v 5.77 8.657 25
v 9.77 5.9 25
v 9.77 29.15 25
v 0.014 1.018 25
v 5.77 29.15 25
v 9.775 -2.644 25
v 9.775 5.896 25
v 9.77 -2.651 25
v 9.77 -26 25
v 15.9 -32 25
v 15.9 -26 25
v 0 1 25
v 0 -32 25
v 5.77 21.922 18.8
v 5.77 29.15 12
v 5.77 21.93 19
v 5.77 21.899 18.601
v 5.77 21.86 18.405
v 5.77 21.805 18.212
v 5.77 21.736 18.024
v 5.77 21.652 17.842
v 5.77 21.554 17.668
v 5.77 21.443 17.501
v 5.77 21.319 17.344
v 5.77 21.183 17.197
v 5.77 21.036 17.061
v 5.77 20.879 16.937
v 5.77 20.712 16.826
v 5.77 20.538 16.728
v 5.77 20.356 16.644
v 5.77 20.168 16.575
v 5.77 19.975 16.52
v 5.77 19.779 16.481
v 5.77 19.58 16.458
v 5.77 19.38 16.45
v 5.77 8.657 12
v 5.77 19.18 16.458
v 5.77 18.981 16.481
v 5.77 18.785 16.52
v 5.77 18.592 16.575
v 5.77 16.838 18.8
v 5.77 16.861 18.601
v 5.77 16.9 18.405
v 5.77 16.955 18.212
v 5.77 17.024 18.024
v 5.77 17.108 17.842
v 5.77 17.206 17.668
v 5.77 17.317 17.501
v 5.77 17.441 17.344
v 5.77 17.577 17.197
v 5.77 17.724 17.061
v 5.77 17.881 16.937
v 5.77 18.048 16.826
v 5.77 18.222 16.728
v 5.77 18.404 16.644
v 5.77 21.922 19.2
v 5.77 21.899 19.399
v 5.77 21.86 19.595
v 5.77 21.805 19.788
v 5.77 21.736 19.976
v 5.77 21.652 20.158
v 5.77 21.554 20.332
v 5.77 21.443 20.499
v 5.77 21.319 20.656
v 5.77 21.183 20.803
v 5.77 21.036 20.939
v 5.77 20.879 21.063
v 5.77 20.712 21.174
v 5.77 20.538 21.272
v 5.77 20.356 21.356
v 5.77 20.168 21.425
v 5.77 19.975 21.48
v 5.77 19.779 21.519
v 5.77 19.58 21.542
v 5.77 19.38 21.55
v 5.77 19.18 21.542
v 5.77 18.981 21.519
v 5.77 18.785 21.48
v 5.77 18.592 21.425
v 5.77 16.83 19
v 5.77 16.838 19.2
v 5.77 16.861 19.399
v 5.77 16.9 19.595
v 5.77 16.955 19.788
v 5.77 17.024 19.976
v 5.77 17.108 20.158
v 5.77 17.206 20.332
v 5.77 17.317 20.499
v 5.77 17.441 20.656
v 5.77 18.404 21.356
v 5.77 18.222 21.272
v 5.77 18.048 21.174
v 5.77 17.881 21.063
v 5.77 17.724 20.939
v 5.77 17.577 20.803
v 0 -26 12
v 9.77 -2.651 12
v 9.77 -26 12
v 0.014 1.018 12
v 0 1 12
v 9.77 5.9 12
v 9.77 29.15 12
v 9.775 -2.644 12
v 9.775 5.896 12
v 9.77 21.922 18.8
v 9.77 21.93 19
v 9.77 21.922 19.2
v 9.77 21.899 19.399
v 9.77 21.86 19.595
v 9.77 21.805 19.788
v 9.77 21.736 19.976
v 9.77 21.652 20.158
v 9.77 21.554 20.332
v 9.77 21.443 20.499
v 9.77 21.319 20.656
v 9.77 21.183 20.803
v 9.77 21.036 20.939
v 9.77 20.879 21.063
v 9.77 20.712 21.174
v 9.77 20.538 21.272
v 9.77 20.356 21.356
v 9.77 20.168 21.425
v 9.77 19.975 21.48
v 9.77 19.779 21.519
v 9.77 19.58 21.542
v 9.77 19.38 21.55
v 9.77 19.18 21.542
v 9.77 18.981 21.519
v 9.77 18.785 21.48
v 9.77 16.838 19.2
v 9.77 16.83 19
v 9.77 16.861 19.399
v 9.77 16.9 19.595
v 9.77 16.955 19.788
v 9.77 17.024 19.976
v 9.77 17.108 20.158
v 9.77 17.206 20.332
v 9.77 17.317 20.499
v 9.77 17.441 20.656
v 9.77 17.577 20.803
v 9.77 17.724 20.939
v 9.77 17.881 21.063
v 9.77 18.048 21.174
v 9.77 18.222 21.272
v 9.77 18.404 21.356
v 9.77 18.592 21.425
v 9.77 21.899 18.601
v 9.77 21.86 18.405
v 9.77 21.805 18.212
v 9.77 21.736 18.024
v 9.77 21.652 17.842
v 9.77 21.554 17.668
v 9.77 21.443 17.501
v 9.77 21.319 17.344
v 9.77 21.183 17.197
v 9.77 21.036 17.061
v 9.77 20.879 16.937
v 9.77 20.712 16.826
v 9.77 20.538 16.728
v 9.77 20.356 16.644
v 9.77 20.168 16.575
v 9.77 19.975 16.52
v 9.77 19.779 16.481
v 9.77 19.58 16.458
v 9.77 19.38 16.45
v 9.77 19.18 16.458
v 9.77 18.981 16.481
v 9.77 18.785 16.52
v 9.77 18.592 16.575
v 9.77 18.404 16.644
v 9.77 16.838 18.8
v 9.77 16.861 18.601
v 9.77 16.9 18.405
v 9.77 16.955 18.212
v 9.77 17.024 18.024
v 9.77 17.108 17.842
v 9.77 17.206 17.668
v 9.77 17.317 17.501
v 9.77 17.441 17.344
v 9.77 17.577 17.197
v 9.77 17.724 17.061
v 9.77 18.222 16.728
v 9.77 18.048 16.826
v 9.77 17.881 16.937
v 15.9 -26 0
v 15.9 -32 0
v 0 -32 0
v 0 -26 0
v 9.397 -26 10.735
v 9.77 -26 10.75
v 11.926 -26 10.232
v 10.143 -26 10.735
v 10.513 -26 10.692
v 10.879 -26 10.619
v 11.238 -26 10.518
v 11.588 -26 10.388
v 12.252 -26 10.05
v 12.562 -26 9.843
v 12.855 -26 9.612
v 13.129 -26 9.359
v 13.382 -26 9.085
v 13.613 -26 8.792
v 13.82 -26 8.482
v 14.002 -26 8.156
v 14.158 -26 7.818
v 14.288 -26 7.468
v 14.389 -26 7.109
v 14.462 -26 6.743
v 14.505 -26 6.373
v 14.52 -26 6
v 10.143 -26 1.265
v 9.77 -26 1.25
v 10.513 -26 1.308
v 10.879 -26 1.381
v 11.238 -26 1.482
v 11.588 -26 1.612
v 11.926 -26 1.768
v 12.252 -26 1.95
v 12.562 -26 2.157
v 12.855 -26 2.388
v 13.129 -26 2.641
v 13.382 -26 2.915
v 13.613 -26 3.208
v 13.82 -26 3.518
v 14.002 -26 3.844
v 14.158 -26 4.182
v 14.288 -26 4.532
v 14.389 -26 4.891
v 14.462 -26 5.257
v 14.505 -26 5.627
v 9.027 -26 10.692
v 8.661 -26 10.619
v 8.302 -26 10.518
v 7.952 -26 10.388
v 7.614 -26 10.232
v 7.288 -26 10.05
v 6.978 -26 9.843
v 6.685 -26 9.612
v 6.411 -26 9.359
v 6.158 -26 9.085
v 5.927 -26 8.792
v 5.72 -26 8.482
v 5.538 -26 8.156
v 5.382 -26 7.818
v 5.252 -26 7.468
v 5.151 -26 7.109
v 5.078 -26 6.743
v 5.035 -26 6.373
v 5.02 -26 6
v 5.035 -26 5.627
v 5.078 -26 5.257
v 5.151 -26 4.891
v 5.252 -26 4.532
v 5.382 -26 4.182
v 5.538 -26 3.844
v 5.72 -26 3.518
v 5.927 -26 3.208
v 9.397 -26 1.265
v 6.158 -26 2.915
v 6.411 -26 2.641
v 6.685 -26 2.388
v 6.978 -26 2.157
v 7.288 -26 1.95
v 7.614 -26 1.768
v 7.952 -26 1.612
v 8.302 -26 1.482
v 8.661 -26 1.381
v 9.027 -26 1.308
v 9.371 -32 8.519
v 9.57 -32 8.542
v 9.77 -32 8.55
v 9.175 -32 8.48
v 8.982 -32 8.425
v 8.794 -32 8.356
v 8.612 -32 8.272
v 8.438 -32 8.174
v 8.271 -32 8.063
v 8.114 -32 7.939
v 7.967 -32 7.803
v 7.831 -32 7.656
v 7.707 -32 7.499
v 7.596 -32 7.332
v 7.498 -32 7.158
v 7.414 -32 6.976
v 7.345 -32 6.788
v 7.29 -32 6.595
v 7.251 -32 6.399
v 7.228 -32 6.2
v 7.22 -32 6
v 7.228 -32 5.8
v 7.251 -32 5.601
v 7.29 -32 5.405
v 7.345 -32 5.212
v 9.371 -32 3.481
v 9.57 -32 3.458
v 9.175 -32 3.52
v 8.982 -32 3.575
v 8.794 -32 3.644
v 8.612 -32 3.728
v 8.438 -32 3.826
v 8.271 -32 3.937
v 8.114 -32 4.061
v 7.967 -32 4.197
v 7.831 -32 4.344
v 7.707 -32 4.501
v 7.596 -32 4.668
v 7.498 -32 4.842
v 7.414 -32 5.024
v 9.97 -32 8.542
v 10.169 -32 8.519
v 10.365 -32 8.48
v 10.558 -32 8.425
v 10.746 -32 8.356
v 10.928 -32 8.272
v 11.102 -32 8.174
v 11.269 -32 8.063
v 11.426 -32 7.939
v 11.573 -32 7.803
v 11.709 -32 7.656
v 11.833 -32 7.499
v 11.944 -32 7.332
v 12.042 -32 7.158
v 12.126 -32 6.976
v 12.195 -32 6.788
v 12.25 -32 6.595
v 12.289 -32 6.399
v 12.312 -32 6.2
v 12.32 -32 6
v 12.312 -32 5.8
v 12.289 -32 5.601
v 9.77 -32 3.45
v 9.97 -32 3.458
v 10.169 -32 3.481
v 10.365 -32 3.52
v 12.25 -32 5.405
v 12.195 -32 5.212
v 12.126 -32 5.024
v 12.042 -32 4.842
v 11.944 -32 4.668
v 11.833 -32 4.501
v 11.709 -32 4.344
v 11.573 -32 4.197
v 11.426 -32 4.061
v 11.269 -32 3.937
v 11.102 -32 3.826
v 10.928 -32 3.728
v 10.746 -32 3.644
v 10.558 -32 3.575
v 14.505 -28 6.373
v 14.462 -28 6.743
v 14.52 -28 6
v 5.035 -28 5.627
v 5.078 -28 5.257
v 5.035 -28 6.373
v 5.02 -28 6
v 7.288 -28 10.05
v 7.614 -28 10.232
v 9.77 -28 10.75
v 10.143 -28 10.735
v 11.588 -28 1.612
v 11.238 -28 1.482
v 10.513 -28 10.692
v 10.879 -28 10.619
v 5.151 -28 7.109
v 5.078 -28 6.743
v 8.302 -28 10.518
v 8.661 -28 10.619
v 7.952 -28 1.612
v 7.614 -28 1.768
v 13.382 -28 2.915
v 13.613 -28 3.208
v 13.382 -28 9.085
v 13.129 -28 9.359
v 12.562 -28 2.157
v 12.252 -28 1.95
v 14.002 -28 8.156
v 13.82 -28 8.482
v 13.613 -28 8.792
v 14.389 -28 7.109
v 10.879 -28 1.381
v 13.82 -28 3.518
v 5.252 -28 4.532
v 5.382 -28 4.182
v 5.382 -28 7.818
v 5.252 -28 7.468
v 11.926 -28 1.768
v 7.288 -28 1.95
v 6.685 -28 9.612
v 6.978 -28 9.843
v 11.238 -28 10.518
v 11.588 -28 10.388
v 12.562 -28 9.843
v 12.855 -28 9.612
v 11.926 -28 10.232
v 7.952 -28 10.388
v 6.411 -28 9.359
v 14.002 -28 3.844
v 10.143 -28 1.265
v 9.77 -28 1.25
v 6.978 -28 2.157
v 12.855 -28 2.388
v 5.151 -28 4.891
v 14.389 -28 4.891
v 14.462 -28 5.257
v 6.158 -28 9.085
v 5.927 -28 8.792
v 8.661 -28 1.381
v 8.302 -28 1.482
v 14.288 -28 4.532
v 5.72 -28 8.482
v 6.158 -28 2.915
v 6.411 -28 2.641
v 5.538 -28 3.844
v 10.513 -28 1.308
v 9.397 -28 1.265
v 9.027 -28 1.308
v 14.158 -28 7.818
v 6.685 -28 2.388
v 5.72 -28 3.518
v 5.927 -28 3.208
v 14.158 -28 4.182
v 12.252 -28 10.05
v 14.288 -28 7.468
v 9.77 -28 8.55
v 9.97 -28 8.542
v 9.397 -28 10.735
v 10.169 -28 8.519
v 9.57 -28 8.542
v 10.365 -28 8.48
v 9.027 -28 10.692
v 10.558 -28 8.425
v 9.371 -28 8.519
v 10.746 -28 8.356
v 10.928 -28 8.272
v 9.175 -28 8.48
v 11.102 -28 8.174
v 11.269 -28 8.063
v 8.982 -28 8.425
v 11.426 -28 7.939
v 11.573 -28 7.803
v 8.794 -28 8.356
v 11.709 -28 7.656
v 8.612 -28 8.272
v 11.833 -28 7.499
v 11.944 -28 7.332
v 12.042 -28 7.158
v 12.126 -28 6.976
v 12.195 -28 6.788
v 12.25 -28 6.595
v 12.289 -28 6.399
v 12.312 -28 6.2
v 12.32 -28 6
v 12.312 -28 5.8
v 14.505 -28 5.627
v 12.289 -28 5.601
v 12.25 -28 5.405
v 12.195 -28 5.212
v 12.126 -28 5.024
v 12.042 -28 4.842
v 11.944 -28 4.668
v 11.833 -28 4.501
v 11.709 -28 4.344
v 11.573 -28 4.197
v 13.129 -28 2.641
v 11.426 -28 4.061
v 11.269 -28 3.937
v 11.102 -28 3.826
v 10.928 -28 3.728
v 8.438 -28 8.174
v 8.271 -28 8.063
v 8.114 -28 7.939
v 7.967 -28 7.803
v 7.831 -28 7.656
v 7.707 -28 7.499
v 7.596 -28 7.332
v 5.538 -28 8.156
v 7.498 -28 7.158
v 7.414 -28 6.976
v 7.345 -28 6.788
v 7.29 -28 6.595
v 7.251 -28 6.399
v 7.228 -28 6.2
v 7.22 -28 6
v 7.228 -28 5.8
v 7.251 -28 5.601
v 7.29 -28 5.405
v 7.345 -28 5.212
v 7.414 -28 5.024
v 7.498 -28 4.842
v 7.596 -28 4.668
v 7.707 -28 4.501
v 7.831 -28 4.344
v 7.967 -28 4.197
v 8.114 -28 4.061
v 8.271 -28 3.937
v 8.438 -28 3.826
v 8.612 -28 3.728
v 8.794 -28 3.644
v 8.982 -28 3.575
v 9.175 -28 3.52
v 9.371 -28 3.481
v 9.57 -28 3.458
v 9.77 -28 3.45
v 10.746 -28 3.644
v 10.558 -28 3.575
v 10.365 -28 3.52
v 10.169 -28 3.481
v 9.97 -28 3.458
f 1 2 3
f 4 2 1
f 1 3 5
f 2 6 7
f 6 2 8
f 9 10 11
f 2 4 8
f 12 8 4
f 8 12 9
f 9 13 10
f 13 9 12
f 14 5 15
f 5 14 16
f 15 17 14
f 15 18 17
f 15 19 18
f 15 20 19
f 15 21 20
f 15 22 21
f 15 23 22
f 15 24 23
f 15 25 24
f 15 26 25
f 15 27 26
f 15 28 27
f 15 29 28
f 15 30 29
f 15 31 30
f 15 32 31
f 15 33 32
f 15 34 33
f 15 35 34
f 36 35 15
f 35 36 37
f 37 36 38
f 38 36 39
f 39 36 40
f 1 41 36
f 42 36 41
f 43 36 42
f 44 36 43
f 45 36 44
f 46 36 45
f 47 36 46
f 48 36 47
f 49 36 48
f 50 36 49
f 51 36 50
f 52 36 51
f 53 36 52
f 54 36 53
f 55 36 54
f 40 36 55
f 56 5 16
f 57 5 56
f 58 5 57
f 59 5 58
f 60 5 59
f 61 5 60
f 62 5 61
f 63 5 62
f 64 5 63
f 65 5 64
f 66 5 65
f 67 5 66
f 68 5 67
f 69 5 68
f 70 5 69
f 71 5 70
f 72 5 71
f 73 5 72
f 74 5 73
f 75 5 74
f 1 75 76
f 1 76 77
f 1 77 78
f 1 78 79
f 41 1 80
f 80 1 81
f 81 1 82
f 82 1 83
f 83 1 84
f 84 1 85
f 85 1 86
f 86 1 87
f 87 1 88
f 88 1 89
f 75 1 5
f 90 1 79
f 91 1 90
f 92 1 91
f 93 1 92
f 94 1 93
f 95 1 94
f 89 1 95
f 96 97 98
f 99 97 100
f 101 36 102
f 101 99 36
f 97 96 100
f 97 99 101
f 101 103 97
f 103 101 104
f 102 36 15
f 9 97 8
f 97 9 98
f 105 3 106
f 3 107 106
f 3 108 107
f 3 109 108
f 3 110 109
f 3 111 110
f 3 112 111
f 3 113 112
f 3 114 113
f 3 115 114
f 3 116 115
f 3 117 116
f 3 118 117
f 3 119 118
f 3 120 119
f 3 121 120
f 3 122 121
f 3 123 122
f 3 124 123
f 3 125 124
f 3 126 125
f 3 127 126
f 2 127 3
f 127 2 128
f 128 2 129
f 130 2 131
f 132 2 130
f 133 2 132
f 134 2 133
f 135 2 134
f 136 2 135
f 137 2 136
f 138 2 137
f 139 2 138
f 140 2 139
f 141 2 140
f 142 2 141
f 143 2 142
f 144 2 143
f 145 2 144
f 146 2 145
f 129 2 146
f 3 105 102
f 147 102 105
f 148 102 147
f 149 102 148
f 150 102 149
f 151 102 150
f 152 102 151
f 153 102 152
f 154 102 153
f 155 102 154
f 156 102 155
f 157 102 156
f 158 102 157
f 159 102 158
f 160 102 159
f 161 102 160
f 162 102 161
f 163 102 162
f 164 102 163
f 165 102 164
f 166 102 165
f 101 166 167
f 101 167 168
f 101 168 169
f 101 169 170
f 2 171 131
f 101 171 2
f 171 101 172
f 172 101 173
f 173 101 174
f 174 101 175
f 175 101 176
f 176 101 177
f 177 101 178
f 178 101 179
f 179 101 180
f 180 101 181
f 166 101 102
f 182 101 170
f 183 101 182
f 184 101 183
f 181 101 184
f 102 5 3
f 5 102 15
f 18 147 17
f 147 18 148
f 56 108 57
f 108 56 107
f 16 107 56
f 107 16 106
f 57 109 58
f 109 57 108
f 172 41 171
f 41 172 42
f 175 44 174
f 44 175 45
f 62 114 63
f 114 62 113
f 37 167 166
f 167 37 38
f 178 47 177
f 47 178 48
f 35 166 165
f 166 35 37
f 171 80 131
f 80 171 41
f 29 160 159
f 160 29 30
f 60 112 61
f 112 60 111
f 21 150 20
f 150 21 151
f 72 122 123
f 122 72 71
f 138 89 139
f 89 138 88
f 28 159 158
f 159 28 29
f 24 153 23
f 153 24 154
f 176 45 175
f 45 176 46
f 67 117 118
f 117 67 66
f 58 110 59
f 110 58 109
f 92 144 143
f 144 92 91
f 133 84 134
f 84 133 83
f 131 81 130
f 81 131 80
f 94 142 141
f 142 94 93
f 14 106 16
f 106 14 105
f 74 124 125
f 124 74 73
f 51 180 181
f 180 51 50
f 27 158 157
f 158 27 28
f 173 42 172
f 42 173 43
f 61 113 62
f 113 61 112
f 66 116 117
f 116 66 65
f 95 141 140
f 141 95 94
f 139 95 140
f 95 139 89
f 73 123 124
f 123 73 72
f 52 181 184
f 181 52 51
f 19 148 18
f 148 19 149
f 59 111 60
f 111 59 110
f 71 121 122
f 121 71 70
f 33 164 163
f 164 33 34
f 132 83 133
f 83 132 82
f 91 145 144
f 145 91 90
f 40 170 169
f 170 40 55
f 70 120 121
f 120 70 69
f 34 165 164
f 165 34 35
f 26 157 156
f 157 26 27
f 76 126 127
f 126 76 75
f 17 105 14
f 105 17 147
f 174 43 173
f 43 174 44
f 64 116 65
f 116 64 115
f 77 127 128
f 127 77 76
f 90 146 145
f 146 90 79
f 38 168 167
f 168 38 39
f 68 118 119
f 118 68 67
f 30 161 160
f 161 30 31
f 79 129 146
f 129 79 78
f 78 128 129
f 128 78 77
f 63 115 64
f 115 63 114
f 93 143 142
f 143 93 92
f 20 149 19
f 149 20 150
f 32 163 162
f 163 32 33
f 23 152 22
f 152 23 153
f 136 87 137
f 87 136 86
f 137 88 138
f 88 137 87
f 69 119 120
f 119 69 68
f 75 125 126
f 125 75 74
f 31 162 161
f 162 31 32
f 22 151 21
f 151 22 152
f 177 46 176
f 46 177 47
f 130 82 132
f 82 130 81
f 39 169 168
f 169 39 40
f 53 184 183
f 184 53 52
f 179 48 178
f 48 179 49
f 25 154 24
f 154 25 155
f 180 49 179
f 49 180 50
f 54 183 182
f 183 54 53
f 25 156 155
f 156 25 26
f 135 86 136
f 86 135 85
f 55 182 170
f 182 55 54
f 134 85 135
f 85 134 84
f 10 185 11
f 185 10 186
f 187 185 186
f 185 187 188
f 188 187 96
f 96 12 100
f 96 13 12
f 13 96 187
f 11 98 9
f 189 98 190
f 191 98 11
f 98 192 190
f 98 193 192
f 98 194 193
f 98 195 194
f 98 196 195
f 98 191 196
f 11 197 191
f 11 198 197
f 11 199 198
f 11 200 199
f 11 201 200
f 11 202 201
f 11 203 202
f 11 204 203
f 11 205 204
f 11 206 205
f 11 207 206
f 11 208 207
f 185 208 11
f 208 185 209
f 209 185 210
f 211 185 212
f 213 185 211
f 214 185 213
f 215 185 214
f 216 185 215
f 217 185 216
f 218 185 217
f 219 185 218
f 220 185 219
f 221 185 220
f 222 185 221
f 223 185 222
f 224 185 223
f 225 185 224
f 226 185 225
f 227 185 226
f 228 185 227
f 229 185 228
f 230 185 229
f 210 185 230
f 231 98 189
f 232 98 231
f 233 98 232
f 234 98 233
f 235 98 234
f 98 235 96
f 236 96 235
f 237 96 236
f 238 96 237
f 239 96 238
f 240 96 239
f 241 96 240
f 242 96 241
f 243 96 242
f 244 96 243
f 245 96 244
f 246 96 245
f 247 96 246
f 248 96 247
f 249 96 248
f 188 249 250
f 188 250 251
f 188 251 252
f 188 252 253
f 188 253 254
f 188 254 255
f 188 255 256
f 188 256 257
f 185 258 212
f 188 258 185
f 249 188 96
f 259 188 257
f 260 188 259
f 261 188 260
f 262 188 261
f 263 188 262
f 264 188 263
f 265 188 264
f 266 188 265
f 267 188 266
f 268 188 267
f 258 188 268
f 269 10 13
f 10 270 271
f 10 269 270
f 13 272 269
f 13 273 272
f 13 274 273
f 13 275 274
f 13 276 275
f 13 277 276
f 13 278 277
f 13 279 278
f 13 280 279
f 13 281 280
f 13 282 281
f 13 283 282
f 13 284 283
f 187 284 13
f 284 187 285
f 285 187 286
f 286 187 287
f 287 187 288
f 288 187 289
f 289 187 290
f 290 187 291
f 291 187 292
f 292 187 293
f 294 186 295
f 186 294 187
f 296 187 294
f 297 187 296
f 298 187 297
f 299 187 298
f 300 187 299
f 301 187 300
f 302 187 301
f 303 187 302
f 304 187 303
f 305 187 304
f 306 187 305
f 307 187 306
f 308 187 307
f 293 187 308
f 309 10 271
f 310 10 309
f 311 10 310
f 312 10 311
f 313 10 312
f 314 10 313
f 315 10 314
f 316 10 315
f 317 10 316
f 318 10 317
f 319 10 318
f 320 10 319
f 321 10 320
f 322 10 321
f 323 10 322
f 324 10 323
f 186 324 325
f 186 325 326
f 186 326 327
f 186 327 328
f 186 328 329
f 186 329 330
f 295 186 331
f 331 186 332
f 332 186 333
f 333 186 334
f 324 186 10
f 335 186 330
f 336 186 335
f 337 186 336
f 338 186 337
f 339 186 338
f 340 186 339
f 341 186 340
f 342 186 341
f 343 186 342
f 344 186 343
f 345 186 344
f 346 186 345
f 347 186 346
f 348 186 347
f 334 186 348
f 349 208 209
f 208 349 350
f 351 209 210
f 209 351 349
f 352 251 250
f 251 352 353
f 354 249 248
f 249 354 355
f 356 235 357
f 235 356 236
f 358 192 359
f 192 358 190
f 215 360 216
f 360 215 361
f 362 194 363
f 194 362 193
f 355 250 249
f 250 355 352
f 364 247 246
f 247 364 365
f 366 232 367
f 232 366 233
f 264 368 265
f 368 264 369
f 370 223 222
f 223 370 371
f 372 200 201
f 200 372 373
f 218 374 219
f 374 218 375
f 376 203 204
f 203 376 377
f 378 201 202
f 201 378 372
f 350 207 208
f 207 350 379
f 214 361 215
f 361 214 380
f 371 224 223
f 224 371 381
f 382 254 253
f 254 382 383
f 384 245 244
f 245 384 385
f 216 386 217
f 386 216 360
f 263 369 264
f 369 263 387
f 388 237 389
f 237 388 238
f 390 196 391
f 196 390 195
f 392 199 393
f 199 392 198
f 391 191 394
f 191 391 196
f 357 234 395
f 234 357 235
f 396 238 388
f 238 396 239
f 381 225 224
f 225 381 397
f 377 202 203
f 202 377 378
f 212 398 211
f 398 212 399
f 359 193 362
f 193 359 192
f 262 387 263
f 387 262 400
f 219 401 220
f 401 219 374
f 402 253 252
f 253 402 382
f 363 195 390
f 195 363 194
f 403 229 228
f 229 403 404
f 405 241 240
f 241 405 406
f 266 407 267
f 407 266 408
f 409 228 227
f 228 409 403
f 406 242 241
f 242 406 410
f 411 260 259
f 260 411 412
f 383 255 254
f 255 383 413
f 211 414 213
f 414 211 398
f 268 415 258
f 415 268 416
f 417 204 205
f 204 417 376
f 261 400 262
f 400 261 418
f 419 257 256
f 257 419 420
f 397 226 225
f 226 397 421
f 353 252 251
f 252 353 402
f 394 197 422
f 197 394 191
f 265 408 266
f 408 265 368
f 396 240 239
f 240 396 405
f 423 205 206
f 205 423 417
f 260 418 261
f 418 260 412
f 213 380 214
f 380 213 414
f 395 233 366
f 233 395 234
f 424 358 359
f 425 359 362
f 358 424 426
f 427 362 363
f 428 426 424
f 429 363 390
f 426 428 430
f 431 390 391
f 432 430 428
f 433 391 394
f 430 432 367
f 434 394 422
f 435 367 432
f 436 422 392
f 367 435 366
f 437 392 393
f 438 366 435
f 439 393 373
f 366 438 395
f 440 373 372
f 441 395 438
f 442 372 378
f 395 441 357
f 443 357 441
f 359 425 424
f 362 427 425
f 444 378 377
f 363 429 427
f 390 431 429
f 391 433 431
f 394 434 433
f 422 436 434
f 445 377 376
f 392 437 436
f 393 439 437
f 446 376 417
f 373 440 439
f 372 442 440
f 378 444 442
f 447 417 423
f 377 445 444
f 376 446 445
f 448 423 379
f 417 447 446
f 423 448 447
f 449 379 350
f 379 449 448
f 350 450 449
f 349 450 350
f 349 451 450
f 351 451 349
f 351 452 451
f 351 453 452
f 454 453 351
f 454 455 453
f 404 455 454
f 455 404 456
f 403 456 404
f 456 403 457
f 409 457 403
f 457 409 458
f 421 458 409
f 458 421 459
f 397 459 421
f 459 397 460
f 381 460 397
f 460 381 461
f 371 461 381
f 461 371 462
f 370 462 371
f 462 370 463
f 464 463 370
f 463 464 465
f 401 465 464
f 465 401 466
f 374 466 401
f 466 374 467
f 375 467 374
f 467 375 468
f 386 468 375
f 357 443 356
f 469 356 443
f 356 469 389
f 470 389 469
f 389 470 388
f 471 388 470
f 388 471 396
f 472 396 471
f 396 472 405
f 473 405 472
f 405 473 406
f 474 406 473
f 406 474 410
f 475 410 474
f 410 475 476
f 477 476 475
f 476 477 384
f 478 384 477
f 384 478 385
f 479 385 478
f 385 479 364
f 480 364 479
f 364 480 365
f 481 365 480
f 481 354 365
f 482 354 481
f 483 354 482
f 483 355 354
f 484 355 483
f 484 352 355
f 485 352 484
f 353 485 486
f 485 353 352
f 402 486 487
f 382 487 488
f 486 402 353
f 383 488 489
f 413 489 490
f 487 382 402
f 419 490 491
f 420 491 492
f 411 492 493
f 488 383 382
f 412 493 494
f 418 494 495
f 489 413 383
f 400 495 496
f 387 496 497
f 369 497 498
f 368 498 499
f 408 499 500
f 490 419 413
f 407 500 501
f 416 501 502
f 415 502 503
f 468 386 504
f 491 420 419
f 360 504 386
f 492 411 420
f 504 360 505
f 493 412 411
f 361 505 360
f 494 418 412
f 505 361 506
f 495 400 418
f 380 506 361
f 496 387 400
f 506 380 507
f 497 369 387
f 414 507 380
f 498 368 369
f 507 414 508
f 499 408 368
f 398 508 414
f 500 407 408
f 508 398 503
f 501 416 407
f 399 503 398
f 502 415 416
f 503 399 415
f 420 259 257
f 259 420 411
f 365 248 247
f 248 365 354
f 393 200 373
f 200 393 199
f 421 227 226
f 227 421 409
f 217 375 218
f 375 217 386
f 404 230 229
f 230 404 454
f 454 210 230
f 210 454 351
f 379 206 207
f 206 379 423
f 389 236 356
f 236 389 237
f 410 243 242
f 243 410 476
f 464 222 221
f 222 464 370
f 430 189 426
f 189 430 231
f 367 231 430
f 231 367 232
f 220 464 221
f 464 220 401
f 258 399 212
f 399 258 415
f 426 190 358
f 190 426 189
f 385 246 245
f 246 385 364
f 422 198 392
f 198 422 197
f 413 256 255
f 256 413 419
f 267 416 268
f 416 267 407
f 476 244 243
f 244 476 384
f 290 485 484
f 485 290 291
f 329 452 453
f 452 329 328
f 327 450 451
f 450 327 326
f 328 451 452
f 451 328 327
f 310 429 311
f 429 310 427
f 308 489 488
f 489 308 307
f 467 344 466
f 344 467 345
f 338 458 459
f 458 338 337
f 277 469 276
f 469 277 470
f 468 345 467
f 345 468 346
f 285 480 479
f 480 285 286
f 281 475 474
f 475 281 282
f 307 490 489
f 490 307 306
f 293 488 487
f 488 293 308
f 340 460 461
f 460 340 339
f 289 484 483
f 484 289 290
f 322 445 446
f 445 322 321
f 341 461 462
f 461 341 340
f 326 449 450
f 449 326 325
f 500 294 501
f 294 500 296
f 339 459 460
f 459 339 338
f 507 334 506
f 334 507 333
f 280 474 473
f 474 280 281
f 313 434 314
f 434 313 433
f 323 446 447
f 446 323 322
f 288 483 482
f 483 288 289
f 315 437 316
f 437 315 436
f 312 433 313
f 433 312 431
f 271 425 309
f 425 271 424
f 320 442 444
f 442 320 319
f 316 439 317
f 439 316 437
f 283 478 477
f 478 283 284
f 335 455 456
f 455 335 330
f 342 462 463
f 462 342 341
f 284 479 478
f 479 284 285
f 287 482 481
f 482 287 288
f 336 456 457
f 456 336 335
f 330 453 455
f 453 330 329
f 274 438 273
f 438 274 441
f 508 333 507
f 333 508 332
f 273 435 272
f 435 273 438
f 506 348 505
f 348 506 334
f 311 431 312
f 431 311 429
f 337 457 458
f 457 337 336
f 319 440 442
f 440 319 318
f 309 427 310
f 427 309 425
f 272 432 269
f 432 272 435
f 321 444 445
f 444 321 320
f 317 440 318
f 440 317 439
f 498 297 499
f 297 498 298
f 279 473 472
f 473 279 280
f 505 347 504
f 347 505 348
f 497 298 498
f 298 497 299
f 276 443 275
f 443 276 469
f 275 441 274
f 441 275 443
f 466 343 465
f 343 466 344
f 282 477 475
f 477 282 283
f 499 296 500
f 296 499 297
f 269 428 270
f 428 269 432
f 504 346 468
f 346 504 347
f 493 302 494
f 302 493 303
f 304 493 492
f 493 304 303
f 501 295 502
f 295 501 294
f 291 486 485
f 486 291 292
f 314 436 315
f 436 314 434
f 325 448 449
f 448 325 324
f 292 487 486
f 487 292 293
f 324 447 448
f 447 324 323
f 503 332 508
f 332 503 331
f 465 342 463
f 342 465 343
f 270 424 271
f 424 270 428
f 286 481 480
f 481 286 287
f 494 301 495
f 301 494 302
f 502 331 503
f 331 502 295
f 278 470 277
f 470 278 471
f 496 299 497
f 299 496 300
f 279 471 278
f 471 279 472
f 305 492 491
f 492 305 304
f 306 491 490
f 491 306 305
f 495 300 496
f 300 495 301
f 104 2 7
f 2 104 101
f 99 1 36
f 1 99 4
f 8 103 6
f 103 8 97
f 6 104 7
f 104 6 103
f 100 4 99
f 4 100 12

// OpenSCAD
$fn=80;

//union for alu-profiles
union(){ 
difference(){
translate([9.77, 6, 12]) rotate([0, 0, 90]) cube([23.15 , 4, 13]);
//translate([8.67, 19.38, 19]) rotate([90, 0, 90]) cylinder(d=9.50, h=5);
translate([3.87, 19.38, 19]) rotate([90, 0, 90]) cylinder(d=5.1, h=7);
}
difference(){
translate([0, -32, 0]) cube([15.9, 6, 25]);
translate([9.77, -32+6+4, 6]) rotate([90, 0, 0]) cylinder(d=9.50, h=6);
translate([9.77, -27, 6]) rotate([90, 0, 0]) cylinder(d=5.1, h=7);
}
difference(){
translate([8, -5, 12]) rotate([0, 0, 53]) cube([9.77,10, 13]);
translate([9.775, -5, 11]) cube([5, 12, 15]);
}
difference(){
translate([0, -26, 12]) cube([9.77, 32, 13]);
translate([-4, 4, 11]) rotate([0, 0, -37]) cube([5, 9, 15]);
}
}
//test
//translate([7, -26-6, 22]) cube([5, 61.15, 5]);
